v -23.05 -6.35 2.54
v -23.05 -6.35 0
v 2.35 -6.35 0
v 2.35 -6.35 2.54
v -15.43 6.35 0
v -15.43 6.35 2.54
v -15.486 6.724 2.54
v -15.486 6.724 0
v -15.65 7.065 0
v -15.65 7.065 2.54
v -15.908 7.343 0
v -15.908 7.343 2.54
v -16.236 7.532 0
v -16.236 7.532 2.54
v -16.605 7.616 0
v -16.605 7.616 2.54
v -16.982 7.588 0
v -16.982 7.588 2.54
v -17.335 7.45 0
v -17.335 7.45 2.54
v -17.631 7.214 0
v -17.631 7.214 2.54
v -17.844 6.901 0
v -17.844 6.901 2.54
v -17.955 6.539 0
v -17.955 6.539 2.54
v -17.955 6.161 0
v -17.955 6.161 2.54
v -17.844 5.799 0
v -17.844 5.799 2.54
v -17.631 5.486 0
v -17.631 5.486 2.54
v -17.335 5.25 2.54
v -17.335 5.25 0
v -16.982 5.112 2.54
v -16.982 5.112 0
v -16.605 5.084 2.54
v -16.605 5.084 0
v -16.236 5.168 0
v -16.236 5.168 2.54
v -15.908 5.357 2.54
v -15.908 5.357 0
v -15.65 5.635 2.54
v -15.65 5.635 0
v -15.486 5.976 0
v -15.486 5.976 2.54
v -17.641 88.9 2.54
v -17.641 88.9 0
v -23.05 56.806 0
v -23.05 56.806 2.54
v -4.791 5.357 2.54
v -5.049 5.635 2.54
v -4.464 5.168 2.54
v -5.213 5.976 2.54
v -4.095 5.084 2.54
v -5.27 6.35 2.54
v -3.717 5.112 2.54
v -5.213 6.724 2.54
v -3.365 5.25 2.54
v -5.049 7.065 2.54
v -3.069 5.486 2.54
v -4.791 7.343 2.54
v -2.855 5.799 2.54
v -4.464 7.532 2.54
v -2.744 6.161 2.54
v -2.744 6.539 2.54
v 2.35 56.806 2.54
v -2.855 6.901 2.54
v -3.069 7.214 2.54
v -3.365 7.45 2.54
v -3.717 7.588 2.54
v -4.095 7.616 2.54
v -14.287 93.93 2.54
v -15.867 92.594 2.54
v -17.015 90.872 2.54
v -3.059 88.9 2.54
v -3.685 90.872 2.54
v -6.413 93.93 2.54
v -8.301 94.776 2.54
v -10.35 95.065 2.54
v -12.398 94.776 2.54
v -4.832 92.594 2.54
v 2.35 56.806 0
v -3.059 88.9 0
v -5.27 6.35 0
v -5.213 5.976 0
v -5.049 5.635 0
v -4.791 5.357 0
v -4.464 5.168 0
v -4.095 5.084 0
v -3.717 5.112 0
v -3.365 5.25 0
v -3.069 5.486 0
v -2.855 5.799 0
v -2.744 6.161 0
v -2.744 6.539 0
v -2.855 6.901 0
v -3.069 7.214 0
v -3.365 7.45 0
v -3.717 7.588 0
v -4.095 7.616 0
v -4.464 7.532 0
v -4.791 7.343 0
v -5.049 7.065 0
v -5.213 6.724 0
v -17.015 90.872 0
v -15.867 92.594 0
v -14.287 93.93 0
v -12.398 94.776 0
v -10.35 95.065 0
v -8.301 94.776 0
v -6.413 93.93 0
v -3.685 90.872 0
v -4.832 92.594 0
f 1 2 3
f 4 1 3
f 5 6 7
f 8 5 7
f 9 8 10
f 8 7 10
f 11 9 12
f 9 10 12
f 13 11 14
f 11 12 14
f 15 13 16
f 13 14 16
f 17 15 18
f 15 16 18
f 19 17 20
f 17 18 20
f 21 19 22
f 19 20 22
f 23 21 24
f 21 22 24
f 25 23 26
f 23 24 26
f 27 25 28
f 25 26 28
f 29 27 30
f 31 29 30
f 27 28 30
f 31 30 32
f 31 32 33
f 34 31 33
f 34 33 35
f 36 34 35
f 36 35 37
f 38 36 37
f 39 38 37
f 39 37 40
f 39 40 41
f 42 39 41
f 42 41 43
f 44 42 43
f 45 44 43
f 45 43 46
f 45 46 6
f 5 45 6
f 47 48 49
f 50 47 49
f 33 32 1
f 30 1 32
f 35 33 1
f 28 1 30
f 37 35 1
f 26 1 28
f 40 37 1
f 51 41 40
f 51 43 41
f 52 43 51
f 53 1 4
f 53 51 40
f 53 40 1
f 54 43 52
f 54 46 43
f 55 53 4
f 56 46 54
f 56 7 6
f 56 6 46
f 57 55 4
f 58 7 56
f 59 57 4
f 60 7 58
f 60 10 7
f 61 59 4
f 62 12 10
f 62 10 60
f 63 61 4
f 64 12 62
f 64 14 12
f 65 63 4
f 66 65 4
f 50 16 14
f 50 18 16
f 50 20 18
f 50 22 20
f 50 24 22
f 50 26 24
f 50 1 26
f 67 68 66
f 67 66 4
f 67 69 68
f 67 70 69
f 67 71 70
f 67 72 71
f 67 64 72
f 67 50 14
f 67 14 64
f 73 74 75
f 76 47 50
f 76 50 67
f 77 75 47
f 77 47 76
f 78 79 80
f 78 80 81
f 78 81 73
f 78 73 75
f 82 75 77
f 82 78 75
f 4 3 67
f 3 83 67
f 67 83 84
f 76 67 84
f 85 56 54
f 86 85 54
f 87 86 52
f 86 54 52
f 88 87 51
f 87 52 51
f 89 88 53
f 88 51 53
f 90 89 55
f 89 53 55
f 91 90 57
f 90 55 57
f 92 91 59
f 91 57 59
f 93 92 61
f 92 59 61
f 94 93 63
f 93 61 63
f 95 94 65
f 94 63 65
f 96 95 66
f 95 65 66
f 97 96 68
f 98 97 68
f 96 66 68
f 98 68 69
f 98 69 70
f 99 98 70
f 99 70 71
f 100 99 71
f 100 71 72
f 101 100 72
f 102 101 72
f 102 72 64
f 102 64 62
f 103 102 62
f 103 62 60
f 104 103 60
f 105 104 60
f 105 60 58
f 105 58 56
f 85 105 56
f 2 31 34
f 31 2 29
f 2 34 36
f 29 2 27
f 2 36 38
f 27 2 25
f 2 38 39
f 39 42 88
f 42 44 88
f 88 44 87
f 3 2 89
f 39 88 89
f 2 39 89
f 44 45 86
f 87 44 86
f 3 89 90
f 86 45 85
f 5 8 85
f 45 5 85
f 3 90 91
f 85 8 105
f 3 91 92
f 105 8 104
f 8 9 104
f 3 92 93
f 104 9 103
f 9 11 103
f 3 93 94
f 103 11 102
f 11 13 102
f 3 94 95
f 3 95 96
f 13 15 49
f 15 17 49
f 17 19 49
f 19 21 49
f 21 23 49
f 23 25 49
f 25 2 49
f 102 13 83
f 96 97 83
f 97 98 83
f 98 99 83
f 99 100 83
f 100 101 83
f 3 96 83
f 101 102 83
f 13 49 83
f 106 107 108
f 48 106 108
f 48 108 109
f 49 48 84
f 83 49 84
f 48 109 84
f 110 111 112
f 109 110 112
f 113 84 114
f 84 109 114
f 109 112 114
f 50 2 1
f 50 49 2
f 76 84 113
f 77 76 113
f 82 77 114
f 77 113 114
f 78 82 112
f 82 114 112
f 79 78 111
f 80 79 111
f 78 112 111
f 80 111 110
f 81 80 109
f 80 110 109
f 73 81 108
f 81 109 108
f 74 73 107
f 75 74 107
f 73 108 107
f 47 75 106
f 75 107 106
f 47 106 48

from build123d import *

# Parameters (mm, degrees)
F1_DEPTH = 2.54
F2_R     = 1.27
F3_DEPTH = 25.4
F4_DEPTH = 6.35


with BuildPart() as f1:
    # F0 (on Top) → F1 (new body)
    with BuildSketch(Plane.XY):
        with BuildLine():
            Line((-17.6407694817, 88.9), (-3.0585505724, 88.9))
            ThreePointArc((-3.0585505724, 88.9), (-10.349660027, 95.0651364676), (-17.6407694817, 88.9))
        make_face()
        Polygon((-10.349660027, 0), (2.350339973, 0), (2.350339973, 56.8060912192), (-3.0585505724, 88.9), (-17.6407694817, 88.9), (-23.049660027, 56.8060912192), (-23.049660027, 0), align=None)
    extrude(amount=F1_DEPTH)

    # F2 (on face) → F3 (cut)
    with BuildSketch(Plane.XY.offset(2.54)):
        with Locations((-16.699660027, 6.35)):
            Circle(F2_R)
        with BuildLine():
            ThreePointArc((-2.729660027, 6.35), (-3.999660027, 7.62), (-5.269660027, 6.35))
            ThreePointArc((-5.269660027, 6.35), (-3.999660027, 5.08), (-2.729660027, 6.35))
        make_face()
    extrude(amount=-F3_DEPTH, mode=Mode.SUBTRACT)

    # F4 (add): a face of the model
    f4_faces = [f1.faces().sort_by_distance(p)[0] for p in [
        (-10.349660027, 0, 1.27),
    ]]
    extrude(f4_faces, amount=F4_DEPTH)


solid = f1.part
